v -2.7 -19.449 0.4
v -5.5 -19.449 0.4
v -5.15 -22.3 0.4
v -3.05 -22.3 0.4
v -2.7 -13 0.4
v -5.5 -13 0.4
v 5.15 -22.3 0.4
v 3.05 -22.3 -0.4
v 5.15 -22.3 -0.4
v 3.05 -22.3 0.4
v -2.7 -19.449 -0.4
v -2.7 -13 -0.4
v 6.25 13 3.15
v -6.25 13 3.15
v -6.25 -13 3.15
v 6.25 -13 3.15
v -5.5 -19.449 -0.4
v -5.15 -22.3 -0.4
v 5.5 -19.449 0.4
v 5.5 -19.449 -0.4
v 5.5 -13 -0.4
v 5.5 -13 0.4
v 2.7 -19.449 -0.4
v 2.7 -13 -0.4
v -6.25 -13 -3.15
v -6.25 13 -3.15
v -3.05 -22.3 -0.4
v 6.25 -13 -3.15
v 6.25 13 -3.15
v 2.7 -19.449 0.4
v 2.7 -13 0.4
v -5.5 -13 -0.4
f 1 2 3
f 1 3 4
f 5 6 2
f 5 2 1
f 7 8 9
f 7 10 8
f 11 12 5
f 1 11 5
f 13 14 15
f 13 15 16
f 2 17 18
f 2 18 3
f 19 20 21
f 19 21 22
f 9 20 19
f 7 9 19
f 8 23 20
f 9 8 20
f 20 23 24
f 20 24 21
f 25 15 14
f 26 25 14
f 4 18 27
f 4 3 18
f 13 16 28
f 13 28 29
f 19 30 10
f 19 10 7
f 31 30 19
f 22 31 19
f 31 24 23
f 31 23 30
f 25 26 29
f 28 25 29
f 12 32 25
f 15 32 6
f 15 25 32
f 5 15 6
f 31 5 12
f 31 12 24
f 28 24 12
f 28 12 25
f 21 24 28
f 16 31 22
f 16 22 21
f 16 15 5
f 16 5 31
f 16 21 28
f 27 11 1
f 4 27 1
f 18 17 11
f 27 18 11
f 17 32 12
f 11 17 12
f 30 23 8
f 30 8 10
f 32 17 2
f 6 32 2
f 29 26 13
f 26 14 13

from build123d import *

# Parameters (mm, degrees)
SKETCH1_W             = 12.5
SKETCH1_H             = 26
BOSS_EXTRUDE1_DEPTH   = 3.15
SKETCH2_W             = 2.8
SKETCH2_H             = 0.8
BOSS_EXTRUDE2_DEPTH   = 9.3
CHAMFER1_SIZE         = 0.35
CHAMFER1_SIZE2        = 2.85052125
CHAMFER1_PART_2_SIZE  = 0.35
CHAMFER1_PART_2_SIZE2 = 2.85052125


with BuildPart() as part:
    # Sketch1 → Boss-Extrude1 (new body, symmetric)
    with BuildSketch(Plane.XY):
        Rectangle(SKETCH1_W, SKETCH1_H)
    extrude(amount=BOSS_EXTRUDE1_DEPTH, both=True)

    # Sketch2 → Boss-Extrude2 (add)
    with BuildSketch(Plane.XZ.offset(13)):
        with Locations((4.1, 0)):
            Rectangle(SKETCH2_W, SKETCH2_H)
        with Locations((-4.1, 0)):
            Rectangle(SKETCH2_W, SKETCH2_H)
    extrude(amount=BOSS_EXTRUDE2_DEPTH)

    # Chamfer1
    chamfer1_edges = [part.edges().sort_by_distance(p)[0] for p in [
        (-5.5, -22.3, 0),
        (-2.7, -22.3, 0),
    ]]
    chamfer1_side = [part.faces().sort_by_distance(p)[0] for p in [
        (-4.1, -22.3, 0),
    ]]
    chamfer(chamfer1_edges, length=CHAMFER1_SIZE, length2=CHAMFER1_SIZE2, reference=chamfer1_side[0])

    # Chamfer1 part 2
    chamfer1_part_2_edges = [part.edges().sort_by_distance(p)[0] for p in [
        (2.7, -22.3, 0),
        (5.5, -22.3, 0),
    ]]
    chamfer1_part_2_side = [part.faces().sort_by_distance(p)[0] for p in [
        (4.1, -22.3, 0),
    ]]
    chamfer(chamfer1_part_2_edges, length=CHAMFER1_PART_2_SIZE, length2=CHAMFER1_PART_2_SIZE2, reference=chamfer1_part_2_side[0])


solid = part.part
